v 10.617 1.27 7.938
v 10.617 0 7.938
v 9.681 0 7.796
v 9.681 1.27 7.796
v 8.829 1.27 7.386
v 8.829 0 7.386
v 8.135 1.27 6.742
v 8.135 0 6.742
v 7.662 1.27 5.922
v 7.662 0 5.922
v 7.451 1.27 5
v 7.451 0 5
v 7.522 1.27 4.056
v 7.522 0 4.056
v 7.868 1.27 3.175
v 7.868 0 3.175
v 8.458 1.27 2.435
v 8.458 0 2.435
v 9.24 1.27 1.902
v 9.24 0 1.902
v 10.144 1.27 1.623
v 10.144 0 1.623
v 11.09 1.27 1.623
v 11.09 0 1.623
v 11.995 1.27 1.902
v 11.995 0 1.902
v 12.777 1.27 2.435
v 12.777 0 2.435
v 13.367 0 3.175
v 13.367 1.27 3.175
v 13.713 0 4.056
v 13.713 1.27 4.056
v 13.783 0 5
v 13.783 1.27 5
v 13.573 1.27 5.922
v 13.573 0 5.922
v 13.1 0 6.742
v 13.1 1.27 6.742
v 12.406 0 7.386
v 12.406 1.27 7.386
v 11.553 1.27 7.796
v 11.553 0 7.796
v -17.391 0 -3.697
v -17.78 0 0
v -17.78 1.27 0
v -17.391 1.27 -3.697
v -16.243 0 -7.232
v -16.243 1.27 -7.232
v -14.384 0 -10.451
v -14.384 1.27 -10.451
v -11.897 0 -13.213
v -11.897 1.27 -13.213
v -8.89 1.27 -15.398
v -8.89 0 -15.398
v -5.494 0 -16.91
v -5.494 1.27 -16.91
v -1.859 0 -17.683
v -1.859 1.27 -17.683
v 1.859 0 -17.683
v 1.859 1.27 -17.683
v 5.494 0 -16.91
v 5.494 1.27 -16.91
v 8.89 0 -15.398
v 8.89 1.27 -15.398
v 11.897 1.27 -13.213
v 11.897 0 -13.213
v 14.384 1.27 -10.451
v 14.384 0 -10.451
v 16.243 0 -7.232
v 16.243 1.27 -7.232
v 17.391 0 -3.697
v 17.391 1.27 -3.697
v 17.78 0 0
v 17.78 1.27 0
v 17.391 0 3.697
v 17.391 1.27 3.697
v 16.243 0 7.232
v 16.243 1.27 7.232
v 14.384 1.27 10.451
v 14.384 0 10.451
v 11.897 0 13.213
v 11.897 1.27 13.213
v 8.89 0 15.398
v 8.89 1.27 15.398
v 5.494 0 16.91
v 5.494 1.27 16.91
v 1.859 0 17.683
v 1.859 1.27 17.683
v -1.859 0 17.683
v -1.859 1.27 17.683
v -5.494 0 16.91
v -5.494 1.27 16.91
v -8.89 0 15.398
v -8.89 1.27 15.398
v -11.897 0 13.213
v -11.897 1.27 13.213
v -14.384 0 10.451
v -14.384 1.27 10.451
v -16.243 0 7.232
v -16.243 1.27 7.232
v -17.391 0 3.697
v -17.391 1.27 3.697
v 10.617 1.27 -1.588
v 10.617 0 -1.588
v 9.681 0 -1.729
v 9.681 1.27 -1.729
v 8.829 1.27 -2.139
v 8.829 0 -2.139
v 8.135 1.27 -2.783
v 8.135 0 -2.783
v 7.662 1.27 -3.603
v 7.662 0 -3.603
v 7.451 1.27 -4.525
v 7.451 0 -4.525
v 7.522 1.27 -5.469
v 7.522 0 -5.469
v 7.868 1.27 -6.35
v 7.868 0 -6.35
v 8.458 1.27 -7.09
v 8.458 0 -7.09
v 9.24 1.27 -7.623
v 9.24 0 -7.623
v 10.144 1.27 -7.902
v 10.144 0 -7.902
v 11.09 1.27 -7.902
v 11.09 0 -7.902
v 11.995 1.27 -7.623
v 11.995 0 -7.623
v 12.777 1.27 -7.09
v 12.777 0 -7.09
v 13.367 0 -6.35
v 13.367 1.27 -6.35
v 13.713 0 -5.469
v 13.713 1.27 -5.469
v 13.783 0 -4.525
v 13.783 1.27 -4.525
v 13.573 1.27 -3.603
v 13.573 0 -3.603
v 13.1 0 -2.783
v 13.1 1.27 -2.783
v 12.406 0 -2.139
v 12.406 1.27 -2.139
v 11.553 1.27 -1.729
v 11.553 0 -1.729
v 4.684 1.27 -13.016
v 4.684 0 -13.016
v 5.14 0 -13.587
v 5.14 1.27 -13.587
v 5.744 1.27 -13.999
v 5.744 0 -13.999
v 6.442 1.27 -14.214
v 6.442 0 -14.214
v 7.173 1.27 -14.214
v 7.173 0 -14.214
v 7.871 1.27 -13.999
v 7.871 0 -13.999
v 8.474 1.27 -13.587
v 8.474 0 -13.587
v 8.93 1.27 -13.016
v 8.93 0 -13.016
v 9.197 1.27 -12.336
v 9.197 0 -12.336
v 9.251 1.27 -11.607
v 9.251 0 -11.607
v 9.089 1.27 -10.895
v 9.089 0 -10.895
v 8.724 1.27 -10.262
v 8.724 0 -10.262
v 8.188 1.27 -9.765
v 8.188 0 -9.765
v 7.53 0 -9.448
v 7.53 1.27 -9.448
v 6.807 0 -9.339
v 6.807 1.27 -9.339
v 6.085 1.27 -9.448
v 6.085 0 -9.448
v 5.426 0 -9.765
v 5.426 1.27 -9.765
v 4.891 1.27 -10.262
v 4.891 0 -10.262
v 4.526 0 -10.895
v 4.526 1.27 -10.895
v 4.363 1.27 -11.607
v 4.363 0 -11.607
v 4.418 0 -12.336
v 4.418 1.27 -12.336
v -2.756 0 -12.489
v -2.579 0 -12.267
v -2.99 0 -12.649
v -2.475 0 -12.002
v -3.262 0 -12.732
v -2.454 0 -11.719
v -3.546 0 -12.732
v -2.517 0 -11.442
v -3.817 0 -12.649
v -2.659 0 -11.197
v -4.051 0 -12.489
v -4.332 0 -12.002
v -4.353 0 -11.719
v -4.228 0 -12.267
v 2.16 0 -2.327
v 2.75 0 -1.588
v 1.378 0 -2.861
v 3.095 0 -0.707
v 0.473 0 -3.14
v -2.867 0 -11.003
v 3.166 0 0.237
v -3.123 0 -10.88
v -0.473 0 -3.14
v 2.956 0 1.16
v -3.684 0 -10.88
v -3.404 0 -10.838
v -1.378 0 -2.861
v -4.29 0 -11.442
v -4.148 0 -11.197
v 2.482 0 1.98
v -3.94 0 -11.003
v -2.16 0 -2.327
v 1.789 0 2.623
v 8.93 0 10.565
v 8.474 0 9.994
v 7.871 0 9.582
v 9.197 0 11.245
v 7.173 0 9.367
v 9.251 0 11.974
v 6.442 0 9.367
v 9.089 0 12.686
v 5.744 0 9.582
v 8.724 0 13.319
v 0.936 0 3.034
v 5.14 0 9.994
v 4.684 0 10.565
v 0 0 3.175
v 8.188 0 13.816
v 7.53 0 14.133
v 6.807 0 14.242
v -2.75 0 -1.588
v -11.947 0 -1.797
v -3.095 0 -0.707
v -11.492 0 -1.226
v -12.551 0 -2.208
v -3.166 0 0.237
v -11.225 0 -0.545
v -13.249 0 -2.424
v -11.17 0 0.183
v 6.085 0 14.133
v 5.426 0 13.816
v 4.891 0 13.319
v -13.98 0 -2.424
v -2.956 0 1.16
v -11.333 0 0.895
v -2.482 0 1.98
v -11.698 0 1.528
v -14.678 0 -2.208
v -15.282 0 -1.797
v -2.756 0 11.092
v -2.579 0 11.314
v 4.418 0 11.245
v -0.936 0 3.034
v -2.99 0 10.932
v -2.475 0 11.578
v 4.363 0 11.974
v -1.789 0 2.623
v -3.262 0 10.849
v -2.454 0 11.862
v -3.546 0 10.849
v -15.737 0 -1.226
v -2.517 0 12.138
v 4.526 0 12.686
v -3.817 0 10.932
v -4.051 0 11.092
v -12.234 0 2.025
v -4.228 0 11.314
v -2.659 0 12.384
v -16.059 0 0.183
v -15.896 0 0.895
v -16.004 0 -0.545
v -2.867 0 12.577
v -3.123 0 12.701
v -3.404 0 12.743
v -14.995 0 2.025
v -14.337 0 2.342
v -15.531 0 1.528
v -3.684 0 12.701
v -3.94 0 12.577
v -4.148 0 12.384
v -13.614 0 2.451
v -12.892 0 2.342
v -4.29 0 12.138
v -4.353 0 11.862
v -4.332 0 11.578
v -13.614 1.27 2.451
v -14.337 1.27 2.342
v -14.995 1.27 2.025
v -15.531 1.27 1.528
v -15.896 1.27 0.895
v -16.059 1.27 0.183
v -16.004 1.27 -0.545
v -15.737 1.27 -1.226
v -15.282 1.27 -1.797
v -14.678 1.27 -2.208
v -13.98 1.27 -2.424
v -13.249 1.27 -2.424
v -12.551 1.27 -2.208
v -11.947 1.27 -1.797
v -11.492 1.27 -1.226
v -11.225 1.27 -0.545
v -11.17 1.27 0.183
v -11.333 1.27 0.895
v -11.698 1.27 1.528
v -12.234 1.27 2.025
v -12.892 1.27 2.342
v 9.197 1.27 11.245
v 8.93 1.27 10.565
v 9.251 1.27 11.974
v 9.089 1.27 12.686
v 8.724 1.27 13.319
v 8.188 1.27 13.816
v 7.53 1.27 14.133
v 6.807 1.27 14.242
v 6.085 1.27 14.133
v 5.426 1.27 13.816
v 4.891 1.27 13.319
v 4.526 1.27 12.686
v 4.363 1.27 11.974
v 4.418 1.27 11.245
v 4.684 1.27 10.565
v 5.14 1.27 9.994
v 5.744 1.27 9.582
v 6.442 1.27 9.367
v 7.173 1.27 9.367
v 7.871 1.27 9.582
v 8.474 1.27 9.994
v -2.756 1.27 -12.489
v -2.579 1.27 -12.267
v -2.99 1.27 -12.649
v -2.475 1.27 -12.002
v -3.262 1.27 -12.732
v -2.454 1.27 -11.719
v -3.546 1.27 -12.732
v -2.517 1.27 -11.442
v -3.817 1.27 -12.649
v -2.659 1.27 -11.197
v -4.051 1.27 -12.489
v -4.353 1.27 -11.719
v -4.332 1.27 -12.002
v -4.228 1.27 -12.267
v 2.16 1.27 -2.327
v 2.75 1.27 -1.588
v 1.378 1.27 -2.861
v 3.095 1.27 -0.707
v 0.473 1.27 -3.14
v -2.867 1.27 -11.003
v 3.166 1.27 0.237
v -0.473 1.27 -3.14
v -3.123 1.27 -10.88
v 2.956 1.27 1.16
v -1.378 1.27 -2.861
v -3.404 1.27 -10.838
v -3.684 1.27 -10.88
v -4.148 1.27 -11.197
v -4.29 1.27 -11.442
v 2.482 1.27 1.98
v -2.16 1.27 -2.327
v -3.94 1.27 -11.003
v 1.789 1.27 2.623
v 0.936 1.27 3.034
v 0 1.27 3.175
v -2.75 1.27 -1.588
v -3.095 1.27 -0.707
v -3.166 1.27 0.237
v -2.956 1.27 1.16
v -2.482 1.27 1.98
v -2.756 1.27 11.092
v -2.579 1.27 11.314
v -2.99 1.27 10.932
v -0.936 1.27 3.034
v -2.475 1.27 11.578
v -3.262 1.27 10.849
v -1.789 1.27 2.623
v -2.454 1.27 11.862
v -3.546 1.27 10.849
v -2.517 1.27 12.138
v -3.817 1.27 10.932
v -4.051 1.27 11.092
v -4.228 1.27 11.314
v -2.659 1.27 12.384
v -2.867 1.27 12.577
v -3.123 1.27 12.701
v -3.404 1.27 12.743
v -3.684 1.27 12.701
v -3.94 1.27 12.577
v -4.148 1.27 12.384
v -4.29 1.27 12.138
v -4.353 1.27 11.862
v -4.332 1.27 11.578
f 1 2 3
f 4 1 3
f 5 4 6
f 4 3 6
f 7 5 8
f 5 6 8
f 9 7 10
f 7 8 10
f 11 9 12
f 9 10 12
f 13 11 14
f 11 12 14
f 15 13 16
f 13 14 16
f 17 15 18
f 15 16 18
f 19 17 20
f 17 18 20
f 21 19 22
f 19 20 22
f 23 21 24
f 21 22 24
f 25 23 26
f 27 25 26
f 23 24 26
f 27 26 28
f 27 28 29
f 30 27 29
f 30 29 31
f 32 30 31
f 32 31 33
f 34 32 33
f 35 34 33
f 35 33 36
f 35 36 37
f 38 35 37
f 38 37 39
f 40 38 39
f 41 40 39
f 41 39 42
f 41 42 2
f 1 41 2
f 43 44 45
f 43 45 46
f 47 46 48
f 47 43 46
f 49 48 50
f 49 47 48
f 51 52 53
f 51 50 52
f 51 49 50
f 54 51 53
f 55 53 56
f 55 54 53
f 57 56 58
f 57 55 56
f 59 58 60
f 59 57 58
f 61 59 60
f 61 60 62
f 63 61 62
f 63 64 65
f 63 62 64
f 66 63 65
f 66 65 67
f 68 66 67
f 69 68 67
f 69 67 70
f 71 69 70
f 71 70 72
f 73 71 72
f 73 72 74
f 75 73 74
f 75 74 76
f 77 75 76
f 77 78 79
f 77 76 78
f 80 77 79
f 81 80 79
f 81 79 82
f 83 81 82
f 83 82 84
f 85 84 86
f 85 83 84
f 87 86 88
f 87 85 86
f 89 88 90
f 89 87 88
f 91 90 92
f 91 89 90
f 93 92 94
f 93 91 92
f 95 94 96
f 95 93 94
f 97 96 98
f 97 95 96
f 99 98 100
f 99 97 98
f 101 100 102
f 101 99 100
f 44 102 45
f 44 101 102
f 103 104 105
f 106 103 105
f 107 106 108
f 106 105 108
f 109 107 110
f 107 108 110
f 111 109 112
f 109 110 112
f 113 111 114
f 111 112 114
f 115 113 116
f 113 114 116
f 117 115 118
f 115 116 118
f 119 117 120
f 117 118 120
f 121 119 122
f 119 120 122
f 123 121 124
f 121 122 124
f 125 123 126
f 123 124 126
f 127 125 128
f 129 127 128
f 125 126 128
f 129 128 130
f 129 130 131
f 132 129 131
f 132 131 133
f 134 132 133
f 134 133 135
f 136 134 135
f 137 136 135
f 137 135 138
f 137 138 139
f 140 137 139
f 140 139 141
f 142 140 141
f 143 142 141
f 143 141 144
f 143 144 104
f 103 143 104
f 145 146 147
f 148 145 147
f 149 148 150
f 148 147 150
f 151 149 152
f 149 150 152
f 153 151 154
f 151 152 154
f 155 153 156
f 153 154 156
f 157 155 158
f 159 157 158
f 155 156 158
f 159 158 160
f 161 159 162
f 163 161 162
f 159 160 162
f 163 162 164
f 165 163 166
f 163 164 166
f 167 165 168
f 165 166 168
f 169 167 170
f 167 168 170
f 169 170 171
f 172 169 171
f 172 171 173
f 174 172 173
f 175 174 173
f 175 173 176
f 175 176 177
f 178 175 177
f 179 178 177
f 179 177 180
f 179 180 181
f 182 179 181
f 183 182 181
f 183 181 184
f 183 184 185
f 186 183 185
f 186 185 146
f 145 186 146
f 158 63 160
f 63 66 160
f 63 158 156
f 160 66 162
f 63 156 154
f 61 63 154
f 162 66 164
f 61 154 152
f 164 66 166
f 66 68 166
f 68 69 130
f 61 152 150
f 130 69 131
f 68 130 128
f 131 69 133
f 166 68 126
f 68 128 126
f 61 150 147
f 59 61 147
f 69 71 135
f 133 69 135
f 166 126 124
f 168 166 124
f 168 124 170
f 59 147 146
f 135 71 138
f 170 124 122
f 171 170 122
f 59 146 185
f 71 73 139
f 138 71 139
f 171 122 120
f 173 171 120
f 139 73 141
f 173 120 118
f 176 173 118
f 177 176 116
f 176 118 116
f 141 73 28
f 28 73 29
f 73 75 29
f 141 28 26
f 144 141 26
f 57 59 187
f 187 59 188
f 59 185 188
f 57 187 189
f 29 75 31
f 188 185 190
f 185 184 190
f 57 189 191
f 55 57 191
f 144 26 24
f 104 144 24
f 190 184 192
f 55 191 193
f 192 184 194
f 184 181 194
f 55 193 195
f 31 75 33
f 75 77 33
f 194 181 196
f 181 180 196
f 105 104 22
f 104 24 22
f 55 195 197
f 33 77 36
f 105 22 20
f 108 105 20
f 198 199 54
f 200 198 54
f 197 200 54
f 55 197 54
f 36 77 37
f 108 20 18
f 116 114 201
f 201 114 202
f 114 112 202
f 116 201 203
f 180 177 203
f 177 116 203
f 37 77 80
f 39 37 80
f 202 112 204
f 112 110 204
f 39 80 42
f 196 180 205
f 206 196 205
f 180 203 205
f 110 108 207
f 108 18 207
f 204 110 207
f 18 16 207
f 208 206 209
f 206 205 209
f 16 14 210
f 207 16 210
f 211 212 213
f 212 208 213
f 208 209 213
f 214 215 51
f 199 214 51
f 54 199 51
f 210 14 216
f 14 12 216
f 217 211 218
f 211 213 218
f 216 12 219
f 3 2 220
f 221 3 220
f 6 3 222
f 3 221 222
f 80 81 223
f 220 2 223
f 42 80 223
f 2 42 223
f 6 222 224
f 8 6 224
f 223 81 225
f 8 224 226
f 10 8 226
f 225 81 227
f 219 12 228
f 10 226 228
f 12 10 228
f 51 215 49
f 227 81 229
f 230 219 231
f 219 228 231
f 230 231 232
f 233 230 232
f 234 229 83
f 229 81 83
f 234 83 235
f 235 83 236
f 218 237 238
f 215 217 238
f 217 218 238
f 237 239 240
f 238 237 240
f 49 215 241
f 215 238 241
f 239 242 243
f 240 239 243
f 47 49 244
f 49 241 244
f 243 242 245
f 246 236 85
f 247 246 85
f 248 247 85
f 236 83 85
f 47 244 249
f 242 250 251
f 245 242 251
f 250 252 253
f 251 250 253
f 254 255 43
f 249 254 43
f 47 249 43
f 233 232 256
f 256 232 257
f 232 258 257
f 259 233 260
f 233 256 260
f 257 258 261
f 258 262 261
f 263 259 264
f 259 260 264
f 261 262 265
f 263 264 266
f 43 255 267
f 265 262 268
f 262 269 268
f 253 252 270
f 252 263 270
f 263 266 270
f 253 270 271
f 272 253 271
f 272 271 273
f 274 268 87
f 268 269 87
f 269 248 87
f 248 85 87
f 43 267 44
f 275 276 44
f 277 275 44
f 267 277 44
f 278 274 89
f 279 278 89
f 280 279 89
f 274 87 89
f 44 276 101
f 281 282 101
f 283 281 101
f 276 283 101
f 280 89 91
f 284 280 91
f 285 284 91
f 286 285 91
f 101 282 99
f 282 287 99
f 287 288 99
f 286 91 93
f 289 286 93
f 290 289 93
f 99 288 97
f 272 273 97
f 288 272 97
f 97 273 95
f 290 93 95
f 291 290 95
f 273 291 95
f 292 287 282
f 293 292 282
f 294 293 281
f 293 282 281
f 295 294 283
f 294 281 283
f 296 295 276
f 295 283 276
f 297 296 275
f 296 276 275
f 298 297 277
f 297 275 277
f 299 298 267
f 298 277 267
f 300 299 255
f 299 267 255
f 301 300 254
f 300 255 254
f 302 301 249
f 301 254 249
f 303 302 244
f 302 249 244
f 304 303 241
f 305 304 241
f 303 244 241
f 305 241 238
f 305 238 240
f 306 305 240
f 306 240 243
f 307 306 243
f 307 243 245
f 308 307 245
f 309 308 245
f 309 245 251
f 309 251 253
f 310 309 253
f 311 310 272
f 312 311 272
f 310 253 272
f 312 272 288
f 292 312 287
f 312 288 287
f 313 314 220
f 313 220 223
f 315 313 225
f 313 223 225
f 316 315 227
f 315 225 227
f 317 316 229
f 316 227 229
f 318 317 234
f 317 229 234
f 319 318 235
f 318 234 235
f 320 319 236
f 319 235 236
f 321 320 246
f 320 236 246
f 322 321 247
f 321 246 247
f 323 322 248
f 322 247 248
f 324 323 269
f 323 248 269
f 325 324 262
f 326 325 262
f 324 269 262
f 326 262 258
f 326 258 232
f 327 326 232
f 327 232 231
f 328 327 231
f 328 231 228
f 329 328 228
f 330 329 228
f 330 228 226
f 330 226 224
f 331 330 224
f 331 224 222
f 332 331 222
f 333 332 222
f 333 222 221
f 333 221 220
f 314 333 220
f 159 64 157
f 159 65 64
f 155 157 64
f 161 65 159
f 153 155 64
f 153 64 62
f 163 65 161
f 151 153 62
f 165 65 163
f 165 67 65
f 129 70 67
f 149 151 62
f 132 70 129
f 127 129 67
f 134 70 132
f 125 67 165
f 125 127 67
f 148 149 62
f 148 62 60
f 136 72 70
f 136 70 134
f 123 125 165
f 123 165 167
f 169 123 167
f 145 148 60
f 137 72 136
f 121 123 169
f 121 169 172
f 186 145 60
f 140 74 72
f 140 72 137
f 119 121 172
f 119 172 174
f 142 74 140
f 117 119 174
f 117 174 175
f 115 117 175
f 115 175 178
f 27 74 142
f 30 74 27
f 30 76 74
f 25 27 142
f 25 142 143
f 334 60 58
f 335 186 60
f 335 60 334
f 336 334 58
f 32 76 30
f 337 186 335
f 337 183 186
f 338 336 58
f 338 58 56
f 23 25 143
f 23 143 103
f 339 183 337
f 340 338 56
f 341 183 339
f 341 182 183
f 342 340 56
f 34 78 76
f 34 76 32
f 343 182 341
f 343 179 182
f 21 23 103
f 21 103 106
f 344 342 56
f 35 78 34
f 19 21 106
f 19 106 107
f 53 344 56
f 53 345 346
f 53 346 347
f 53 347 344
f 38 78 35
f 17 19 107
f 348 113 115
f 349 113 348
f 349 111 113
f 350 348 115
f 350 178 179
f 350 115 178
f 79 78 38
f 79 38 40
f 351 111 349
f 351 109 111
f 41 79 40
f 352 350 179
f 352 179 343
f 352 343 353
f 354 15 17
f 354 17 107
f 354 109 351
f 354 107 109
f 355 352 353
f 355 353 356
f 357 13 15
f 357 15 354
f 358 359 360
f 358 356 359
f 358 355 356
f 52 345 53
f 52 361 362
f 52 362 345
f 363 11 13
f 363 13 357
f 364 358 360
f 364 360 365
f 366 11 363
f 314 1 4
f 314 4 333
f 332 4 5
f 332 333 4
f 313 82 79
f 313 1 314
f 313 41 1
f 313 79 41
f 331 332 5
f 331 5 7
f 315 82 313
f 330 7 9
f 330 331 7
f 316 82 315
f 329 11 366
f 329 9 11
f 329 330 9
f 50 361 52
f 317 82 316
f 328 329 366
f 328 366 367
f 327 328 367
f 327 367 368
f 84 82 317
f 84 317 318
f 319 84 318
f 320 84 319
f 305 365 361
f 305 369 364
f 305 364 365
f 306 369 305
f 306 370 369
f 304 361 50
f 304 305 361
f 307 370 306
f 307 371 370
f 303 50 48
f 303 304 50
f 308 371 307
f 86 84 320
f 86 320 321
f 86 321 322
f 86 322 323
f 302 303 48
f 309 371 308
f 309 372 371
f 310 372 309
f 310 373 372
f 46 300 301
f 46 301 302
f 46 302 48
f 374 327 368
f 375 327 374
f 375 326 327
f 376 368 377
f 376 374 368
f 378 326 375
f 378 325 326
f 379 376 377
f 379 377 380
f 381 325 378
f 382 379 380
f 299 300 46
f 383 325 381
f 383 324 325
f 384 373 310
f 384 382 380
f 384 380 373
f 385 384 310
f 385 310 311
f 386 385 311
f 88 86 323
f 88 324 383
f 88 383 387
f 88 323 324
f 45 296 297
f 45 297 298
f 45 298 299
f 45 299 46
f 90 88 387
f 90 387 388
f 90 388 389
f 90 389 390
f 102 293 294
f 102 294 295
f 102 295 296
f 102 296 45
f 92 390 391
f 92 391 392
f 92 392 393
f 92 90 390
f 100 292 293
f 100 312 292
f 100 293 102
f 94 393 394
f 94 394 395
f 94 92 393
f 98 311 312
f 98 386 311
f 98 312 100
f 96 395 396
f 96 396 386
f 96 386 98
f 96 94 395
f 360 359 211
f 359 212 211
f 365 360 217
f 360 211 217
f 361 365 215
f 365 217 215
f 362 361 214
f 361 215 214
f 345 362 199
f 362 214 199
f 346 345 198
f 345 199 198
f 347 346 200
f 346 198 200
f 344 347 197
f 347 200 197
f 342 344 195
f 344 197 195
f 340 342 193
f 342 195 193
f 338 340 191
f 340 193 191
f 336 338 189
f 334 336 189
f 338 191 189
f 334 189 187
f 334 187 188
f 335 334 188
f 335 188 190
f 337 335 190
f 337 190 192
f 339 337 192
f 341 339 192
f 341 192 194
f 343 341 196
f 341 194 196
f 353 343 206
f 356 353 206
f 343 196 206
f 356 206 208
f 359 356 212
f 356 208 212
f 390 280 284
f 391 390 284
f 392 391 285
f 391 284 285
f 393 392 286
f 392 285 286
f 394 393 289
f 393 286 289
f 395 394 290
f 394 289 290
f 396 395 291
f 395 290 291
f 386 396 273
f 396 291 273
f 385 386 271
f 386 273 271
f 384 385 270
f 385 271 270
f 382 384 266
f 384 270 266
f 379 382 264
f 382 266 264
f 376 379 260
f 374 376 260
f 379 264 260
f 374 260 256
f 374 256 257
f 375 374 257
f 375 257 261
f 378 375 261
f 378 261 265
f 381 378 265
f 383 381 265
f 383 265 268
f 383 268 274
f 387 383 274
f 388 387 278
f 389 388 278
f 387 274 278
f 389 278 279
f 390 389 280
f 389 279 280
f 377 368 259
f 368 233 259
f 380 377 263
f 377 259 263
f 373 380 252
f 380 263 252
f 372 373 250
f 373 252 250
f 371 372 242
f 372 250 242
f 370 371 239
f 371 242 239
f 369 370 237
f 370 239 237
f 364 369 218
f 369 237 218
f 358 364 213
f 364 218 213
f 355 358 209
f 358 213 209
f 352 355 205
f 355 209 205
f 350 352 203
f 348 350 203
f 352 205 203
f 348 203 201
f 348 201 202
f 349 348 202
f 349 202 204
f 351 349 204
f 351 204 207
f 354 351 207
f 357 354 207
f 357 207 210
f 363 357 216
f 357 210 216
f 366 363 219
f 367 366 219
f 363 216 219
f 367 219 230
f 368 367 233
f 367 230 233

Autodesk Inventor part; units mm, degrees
ref_plane "YZ Plane" through (0, 0, 0) normal (1, 0, 0) x (0, 1, 0)
ref_plane "XZ Plane" through (0, 0, 0) normal (0, 1, 0) x (-1, 0, 0)
ref_plane "XY Plane" through (0, 0, 0) normal (0, 0, 1) x (1, 0, 0)
sketch "Sketch1" plane through (0, 0, 0) normal (0, 1, 0) x (-1, 0, 0)
  circle A0 centre (0, 0) radius 17.78
  dimension "d0" = 35.56
extrude "Extrusion1" add sketch "Sketch1" along normal blind 1.27
sketch "Sketch2" plane through (0, 1.27, 0) normal (0, 1, 0) x (1, 0, 0)
  circle A0 centre (0, 0) radius 17.78 projected
hole "Hole1" at (0, 1.27, 0) direction (0, -1, 0) diameter 6.35 end through all
sketch "Sketch3" plane through (0, 1.27, 0) normal (0, 1, 0) x (1, 0, 0)
  line L0 (0, 0) -> (-13.6144, 0)
  dimension "d10" = 13.6144
hole "Hole2" at (-13.6144, 1.27, 0) direction (0, -1, 0) diameter 4.9022 end through all
pattern_circular "Circular Pattern1" count 3 over 360 about axis through (0, -49.0355, 0) along (0, 1, 0) of "Hole2"
sketch "Sketch5" plane through (0, 1.27, 0) normal (0, 1, 0) x (1, 0, 0)
  circle A0 centre (-13.6144, 0) radius 2.4511 projected
  circle A1 centre (6.8072, 11.7904) radius 2.4511 projected
  line L0 (-13.6144, 0) -> (6.8072, 11.7904)
  circle A2 centre (6.8072, -11.7904) radius 2.4511 projected
  line L1 (6.8072, 11.7904) -> (6.8072, -11.7904)
  line L2 (6.8072, -11.7904) -> (-13.6144, 0)
  line L3 (-13.6144, 0) -> (-13.6144, -11.7904)
  line L4 (-13.6144, -11.7904) -> (6.8072, -11.7904)
  line L5 (-13.6144, 0) -> (-13.6144, 11.7904)
  line L6 (-13.6144, 11.7904) -> (6.8072, 11.7904)
  circle A3 centre (-3.4036, 11.7904) radius 0.635
  circle A4 centre (-3.4036, -11.7904) radius 0.635
  point P0 (0, 0)
  dimension "d28" = 1.27
hole "Hole4" at (-3.4036, 1.27, 11.7904) at (-3.4036, 1.27, -11.7904) direction (0, -1, 0) diameter 1.905 depth 6.35 tip angle 118
sketch "Sketch6" plane through (0, 1.27, 0) normal (0, 1, 0) x (1, 0, 0)
  circle A0 centre (6.8072, 11.7904) radius 2.4511 projected
  circle A1 centre (6.8072, -11.7904) radius 2.4511 projected
  line L0 (6.8072, 11.7904) -> (6.8072, -11.7904)
  line L1 (0, 0) -> (17.6436, 0)
  line L2 (0, 0) -> (12.7, 0)
  line L3 (0, 0) -> (17.78, 0)
  circle A2 centre (0, 0) radius 17.78 projected
  line L4 (6.8072, 0) -> (10.6172, 0)
  line L5 (10.6172, 0) -> (10.6172, 6.35)
  line L6 (10.6172, 6.35) -> (10.6172, -6.35)
  line L7 (10.6172, -6.35) -> (10.6172, -3.175)
  line L8 (10.6172, -3.175) -> (10.6172, 3.175)
  line L9 (10.6172, 6.35) -> (10.6172, 3.175)
  line L10 (10.6172, -3.175) -> (10.6172, -6.35)
  circle A3 centre (10.6172, 4.7625) radius 3.175
  circle A4 centre (10.6172, -4.7625) radius 3.175
  dimension "d36" = 12.7
  dimension "d37" = 3.81
  dimension "d38" = 6.35
  dimension "d39" = 12.7
  dimension "d40" = 3.175
  dimension "d41" = 6.35
  dimension "d42" = 180
  dimension "d43" = 6.35
  dimension "d44" = 6.35
hole "Hole5" at (10.6172, 1.27, -4.7625) at (10.6172, 1.27, 4.7625) direction (0, -1, 0) diameter 6.35 depth 6.35
properties part number "buffer" material "PBT Plastic"
